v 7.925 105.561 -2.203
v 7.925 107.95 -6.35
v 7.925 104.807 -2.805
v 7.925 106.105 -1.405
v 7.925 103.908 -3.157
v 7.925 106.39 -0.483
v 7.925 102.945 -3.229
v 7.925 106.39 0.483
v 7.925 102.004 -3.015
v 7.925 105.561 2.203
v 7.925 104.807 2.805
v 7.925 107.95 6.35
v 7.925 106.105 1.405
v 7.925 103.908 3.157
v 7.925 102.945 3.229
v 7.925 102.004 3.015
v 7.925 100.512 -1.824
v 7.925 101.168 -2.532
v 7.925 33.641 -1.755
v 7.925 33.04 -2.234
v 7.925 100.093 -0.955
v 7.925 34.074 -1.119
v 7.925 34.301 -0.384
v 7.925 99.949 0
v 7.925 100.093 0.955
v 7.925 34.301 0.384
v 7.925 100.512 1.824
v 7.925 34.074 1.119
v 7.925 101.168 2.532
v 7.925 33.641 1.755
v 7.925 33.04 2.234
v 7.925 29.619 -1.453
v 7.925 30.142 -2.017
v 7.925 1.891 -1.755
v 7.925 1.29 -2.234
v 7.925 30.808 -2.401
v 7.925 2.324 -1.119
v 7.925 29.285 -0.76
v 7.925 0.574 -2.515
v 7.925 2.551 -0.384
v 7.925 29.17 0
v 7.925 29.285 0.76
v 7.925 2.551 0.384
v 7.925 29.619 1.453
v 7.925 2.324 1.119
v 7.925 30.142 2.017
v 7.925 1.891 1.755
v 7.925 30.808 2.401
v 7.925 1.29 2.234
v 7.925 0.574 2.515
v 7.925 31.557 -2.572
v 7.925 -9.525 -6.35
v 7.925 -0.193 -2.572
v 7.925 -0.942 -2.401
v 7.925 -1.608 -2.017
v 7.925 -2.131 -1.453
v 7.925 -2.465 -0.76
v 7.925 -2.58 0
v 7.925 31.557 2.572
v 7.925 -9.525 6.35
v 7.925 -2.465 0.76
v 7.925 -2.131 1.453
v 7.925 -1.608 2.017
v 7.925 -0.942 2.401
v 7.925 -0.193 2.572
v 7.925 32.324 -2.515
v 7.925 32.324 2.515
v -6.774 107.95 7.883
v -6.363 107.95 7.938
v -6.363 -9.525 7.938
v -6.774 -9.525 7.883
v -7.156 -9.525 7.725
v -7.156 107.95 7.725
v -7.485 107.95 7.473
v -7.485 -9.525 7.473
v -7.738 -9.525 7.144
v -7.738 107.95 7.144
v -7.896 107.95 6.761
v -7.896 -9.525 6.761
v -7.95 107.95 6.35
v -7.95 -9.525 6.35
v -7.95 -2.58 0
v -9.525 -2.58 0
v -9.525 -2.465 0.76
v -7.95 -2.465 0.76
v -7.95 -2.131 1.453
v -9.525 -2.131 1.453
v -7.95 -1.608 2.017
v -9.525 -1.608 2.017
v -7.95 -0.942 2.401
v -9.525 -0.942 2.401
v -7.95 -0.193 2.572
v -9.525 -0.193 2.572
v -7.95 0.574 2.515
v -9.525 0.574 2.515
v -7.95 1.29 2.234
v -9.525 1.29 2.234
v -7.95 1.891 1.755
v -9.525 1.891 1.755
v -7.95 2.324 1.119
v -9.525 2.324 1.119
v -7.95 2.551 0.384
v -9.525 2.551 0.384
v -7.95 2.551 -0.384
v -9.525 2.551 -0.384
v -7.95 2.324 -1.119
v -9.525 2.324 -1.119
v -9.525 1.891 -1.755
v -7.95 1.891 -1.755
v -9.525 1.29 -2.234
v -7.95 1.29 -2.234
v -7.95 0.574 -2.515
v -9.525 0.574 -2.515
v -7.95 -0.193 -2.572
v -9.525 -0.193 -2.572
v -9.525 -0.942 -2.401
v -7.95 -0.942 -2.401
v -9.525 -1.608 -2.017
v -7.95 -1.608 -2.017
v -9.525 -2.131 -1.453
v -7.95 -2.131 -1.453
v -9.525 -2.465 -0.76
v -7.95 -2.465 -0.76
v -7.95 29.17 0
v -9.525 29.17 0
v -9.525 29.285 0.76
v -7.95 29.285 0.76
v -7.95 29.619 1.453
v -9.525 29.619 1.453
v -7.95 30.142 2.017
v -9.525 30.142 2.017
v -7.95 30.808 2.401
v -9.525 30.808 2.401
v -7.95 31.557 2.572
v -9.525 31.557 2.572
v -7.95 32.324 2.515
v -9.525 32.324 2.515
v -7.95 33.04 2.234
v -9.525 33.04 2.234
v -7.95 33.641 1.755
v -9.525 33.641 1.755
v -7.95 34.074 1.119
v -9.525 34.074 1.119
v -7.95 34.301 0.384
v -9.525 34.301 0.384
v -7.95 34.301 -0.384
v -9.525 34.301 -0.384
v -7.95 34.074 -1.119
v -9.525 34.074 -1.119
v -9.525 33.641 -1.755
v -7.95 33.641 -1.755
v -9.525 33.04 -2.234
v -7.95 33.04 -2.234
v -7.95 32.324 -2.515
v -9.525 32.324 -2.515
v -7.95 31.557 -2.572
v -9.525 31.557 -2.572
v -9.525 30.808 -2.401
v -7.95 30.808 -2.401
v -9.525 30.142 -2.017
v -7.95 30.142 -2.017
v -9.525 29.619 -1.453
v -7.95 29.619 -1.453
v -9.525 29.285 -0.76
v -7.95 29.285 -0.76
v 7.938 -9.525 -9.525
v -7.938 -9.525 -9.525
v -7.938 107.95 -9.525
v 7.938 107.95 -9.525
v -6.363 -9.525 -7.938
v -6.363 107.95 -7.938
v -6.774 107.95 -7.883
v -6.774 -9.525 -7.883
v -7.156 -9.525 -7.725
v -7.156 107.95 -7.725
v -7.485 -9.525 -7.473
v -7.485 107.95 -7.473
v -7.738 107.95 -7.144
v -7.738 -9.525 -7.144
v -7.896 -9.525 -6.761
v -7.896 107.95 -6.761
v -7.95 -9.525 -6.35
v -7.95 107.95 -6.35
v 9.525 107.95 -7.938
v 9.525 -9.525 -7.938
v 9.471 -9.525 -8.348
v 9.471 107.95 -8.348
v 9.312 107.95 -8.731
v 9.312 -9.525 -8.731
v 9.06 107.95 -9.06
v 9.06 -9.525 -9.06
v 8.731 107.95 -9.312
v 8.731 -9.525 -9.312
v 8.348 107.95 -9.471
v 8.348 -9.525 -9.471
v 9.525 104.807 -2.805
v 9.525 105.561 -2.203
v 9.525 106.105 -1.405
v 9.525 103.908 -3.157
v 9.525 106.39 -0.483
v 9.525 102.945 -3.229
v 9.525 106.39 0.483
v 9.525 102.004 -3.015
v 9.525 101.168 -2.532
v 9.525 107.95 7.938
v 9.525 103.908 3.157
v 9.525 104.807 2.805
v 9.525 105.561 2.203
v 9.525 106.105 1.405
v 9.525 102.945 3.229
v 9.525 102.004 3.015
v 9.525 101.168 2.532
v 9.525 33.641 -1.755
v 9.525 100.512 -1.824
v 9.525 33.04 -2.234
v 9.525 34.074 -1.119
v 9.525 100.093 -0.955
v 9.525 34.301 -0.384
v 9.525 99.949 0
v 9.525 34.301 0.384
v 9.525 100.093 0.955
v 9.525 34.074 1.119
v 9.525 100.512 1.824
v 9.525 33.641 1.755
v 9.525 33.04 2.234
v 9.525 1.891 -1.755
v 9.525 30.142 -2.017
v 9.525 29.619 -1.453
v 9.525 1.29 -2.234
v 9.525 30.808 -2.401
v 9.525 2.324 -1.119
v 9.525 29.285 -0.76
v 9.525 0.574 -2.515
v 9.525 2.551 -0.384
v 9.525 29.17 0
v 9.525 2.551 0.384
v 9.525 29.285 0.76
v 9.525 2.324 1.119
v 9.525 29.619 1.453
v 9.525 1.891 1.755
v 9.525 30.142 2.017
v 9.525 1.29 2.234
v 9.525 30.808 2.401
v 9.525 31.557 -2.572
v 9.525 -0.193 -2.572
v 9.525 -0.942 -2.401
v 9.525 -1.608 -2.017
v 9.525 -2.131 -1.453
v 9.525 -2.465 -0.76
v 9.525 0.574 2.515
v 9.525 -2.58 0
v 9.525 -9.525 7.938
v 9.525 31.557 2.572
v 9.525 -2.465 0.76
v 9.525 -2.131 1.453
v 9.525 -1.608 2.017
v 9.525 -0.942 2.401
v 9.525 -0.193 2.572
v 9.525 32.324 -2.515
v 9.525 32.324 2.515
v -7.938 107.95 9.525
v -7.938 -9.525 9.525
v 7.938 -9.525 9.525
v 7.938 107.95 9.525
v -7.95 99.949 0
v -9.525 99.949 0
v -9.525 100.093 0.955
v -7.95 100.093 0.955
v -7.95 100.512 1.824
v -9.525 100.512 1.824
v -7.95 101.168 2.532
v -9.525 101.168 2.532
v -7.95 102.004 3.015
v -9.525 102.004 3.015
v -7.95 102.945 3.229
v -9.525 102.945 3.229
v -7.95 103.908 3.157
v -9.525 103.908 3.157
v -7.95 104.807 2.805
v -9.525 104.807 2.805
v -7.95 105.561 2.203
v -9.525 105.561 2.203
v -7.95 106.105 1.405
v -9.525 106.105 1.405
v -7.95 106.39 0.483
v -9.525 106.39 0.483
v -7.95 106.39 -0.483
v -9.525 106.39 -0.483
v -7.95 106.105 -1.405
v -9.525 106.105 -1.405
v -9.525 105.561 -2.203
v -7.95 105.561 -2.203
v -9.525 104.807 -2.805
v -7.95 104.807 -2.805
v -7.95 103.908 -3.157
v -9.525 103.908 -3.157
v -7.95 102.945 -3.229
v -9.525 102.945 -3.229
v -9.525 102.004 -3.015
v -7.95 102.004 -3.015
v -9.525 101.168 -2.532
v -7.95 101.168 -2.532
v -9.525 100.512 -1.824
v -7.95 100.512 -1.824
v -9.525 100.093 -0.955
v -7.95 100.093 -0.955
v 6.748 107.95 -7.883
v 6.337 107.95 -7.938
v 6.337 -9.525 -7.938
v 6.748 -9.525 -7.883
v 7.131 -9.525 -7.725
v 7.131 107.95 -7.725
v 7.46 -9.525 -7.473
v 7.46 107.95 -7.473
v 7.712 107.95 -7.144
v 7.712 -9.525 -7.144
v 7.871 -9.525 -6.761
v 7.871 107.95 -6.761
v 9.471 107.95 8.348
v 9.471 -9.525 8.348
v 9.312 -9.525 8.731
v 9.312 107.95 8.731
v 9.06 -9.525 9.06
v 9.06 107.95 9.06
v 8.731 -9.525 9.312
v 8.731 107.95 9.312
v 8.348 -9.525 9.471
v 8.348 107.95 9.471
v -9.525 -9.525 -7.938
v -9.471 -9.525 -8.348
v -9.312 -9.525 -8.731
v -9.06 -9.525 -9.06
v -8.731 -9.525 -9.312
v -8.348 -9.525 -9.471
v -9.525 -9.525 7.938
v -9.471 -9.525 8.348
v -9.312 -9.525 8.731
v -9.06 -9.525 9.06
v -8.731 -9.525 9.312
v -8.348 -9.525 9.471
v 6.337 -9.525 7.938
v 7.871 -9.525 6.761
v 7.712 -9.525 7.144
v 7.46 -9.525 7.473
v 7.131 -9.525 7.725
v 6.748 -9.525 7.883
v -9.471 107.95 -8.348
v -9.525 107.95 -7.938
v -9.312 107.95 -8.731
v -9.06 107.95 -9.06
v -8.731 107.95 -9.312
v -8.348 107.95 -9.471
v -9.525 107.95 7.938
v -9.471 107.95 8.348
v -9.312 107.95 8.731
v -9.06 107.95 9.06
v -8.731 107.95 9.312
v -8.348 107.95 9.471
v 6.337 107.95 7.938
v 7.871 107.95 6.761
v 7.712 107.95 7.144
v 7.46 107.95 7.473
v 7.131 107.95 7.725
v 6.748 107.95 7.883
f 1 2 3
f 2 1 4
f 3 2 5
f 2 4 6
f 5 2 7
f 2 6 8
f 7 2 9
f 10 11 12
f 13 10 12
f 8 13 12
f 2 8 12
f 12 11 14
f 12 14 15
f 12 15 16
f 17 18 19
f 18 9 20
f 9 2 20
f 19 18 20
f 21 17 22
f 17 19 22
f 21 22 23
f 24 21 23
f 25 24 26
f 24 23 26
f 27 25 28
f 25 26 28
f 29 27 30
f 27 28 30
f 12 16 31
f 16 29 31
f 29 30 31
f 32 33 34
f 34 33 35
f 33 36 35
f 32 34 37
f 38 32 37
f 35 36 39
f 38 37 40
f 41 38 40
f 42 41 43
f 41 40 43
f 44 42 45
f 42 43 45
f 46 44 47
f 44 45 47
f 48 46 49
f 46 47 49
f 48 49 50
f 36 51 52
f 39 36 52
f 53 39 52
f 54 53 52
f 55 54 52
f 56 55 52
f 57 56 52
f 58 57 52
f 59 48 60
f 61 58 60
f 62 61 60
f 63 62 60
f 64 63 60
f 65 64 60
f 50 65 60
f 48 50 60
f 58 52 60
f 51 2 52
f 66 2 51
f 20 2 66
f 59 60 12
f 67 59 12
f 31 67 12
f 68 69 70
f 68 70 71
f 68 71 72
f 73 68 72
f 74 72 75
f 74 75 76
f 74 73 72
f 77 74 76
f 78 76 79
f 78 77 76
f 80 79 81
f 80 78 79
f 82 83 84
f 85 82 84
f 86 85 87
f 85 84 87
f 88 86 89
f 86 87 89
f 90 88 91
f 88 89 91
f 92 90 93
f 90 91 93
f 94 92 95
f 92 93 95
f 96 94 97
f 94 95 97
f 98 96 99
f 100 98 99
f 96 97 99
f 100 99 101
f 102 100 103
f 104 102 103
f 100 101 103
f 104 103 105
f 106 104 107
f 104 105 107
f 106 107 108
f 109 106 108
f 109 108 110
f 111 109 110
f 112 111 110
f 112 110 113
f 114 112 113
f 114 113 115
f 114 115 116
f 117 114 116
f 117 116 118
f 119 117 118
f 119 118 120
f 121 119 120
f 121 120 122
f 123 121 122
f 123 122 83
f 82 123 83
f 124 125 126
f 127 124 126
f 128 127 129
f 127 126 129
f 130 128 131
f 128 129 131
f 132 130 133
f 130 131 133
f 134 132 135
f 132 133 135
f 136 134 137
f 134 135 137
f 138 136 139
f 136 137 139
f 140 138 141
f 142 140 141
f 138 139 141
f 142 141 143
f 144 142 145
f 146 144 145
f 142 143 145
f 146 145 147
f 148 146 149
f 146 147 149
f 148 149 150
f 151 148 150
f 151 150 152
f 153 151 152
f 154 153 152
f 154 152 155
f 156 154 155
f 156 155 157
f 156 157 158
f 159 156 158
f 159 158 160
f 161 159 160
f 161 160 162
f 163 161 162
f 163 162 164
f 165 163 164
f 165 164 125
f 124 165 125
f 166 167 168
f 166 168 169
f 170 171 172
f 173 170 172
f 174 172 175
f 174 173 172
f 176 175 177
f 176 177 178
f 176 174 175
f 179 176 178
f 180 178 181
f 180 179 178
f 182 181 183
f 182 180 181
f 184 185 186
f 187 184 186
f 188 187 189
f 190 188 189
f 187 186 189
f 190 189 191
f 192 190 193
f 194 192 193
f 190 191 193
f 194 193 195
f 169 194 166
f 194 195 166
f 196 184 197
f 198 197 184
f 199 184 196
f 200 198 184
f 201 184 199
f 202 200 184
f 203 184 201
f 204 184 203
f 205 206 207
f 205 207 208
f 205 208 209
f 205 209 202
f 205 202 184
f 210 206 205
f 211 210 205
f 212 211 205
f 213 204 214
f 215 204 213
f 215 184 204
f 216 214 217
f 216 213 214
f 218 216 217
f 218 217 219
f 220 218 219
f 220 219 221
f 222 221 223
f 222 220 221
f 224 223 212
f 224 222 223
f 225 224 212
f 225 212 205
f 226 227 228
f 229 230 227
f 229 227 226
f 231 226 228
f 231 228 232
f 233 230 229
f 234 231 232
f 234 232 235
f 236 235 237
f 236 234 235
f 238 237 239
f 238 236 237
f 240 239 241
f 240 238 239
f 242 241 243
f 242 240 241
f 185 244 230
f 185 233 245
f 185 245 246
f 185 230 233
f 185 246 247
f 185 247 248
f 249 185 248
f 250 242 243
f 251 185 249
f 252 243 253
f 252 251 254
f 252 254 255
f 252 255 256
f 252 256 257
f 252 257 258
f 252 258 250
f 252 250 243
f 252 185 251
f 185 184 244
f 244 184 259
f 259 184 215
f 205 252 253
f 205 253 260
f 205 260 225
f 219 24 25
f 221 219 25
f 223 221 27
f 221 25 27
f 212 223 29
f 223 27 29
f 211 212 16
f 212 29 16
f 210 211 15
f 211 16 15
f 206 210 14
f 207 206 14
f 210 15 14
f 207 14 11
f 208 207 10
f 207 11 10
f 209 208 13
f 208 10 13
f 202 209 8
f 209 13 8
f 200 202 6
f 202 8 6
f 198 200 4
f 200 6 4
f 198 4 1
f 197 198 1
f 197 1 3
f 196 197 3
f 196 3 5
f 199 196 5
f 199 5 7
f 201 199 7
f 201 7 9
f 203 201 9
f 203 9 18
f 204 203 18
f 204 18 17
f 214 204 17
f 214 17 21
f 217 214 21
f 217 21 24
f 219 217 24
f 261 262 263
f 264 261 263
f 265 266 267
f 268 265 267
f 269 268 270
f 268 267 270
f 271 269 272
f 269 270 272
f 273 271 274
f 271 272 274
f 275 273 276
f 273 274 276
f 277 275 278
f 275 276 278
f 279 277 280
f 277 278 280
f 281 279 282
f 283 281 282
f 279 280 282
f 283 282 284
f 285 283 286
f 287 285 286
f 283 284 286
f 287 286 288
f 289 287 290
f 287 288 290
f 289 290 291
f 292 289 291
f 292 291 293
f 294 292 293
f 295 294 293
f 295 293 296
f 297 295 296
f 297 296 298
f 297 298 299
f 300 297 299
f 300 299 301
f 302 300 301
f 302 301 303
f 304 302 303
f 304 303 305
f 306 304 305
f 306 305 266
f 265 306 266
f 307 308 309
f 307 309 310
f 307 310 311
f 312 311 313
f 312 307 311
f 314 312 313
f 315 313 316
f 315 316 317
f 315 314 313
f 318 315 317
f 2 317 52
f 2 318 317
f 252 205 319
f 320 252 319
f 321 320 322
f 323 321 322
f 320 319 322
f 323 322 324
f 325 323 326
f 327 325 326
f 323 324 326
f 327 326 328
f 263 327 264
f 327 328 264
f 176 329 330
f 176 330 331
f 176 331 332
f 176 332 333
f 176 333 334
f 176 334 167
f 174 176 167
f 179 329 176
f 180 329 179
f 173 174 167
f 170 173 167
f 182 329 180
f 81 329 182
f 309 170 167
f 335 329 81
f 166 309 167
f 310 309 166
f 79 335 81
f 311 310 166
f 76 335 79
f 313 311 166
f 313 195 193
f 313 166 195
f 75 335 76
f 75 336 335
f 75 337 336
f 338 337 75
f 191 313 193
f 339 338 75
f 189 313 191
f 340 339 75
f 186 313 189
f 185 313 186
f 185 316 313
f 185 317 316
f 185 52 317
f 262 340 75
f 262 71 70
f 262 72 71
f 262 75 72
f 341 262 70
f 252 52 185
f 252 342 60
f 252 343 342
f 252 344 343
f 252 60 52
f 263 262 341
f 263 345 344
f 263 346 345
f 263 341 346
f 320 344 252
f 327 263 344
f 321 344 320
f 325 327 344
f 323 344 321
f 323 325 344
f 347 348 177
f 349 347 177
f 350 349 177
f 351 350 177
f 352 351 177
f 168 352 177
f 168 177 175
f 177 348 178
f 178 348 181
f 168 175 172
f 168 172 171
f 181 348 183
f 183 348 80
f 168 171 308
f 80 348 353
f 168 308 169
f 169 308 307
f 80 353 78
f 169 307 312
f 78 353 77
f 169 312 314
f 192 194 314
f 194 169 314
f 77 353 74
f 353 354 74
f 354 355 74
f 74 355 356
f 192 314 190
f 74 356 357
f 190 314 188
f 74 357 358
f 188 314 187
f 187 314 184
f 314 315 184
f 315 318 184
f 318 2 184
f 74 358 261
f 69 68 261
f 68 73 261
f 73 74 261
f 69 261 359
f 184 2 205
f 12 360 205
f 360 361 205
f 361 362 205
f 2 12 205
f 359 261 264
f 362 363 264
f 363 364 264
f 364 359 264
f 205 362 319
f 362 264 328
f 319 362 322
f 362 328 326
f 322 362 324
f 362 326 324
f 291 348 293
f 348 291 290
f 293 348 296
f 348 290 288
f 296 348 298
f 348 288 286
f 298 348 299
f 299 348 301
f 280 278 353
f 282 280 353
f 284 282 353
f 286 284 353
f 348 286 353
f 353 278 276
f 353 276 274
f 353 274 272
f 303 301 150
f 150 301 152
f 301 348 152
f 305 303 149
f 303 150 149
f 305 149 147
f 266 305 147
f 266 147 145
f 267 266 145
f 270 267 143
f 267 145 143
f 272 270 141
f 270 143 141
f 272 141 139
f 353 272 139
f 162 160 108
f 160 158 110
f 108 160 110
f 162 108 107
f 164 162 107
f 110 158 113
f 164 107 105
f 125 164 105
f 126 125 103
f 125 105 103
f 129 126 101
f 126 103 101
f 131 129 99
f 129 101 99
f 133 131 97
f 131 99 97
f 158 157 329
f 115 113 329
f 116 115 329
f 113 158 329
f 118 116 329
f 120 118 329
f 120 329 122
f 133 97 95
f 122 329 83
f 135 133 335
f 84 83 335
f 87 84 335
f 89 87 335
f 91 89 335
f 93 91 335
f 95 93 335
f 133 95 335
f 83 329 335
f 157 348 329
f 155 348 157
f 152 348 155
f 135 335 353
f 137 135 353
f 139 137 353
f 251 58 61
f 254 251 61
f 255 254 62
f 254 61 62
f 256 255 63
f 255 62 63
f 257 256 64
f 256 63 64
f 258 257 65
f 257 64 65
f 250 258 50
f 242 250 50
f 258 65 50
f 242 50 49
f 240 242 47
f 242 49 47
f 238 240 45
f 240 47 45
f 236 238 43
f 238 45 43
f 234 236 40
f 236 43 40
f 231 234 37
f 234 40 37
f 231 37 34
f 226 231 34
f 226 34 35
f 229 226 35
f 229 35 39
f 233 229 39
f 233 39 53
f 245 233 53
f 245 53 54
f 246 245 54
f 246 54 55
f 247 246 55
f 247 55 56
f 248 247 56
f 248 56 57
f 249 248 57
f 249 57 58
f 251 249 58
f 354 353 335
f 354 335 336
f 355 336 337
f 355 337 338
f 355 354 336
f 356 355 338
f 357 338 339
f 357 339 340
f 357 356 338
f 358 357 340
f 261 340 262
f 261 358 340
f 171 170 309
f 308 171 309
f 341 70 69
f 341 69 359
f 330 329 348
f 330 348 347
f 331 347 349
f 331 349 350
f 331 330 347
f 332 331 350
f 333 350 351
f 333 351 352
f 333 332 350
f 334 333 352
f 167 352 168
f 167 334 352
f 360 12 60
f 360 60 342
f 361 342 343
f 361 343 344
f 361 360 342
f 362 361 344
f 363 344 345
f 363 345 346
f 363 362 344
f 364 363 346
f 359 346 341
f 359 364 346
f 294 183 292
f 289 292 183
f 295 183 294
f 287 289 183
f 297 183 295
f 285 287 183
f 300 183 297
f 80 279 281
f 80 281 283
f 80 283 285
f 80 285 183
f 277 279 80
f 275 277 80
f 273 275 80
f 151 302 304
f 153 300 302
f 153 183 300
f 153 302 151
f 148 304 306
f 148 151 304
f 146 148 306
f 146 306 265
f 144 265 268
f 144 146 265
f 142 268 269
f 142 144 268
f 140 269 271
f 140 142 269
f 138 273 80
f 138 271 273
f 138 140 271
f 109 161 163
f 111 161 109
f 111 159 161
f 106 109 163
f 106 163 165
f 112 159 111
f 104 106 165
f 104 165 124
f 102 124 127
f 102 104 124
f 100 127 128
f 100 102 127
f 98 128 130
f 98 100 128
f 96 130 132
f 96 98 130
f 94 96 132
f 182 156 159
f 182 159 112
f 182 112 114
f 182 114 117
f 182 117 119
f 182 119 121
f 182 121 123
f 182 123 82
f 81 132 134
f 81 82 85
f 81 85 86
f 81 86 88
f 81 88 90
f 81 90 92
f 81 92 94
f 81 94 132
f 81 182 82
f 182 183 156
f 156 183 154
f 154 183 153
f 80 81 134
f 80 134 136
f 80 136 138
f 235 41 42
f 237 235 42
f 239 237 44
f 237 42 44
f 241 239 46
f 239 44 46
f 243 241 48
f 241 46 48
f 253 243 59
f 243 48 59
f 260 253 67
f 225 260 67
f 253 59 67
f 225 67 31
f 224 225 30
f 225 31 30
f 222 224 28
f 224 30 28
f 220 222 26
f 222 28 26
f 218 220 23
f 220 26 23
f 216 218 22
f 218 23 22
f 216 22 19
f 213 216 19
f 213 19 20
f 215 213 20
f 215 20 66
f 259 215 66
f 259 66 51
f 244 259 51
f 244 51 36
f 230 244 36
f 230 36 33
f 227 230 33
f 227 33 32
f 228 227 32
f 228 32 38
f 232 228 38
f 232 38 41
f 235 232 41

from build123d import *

# Parameters (mm, degrees)
F0_W     = 19.05
F0_H     = 19.05
F0_W_2   = 15.875
F0_H_2   = 15.875
F1_DEPTH = 107.95
F2_R     = 1.5875
F3_R     = 1.5875
F4_R     = 3.2385
F4_R_2   = 2.5796875
F5_DEPTH = 19.05
F6_DEPTH = 98.425


with BuildPart() as f1:
    # F0 (on Front) → F1 (new body, symmetric)
    with BuildSketch(Plane.XZ):
        Rectangle(F0_W, F0_H)
        with Locations((-0.0127, 0)):
            Rectangle(F0_W_2, F0_H_2, mode=Mode.SUBTRACT)
    extrude(amount=F1_DEPTH, both=True)

    # F2
    f2_edges = [f1.edges().sort_by_distance(p)[0] for p in [
        (-9.525, 0, 9.525),
        (-9.525, 0, -9.525),
        (9.525, 0, -9.525),
        (9.525, 0, 9.525),
    ]]
    fillet(f2_edges, radius=F2_R)

    # F3
    f3_edges = [f1.edges().sort_by_distance(p)[0] for p in [
        (-7.9502, 0, 7.9375),
        (-7.9502, 0, -7.9375),
        (7.9248, 0, 7.9375),
        (7.9248, 0, -7.9375),
    ]]
    fillet(f3_edges, radius=F3_R)

    # F4 (on face) → F5 (cut)
    with BuildSketch(Plane(origin=(-9.525, 0, 0), x_dir=(0, -1, 0), z_dir=(-1, 0, 0))):
        with Locations((-103.1875, 0)):
            Circle(F4_R)
        with Locations((-31.75, 0)):
            Circle(F4_R_2)
        Circle(F4_R_2)
    extrude(amount=-F5_DEPTH, mode=Mode.SUBTRACT)

    # F6 (cut): a face of the model
    f6_faces = [f1.faces().sort_by_distance(p)[0] for p in [
        (-8.2196076836, -107.95, 0),
    ]]
    extrude(f6_faces, amount=-F6_DEPTH, mode=Mode.SUBTRACT)


solid = f1.part
